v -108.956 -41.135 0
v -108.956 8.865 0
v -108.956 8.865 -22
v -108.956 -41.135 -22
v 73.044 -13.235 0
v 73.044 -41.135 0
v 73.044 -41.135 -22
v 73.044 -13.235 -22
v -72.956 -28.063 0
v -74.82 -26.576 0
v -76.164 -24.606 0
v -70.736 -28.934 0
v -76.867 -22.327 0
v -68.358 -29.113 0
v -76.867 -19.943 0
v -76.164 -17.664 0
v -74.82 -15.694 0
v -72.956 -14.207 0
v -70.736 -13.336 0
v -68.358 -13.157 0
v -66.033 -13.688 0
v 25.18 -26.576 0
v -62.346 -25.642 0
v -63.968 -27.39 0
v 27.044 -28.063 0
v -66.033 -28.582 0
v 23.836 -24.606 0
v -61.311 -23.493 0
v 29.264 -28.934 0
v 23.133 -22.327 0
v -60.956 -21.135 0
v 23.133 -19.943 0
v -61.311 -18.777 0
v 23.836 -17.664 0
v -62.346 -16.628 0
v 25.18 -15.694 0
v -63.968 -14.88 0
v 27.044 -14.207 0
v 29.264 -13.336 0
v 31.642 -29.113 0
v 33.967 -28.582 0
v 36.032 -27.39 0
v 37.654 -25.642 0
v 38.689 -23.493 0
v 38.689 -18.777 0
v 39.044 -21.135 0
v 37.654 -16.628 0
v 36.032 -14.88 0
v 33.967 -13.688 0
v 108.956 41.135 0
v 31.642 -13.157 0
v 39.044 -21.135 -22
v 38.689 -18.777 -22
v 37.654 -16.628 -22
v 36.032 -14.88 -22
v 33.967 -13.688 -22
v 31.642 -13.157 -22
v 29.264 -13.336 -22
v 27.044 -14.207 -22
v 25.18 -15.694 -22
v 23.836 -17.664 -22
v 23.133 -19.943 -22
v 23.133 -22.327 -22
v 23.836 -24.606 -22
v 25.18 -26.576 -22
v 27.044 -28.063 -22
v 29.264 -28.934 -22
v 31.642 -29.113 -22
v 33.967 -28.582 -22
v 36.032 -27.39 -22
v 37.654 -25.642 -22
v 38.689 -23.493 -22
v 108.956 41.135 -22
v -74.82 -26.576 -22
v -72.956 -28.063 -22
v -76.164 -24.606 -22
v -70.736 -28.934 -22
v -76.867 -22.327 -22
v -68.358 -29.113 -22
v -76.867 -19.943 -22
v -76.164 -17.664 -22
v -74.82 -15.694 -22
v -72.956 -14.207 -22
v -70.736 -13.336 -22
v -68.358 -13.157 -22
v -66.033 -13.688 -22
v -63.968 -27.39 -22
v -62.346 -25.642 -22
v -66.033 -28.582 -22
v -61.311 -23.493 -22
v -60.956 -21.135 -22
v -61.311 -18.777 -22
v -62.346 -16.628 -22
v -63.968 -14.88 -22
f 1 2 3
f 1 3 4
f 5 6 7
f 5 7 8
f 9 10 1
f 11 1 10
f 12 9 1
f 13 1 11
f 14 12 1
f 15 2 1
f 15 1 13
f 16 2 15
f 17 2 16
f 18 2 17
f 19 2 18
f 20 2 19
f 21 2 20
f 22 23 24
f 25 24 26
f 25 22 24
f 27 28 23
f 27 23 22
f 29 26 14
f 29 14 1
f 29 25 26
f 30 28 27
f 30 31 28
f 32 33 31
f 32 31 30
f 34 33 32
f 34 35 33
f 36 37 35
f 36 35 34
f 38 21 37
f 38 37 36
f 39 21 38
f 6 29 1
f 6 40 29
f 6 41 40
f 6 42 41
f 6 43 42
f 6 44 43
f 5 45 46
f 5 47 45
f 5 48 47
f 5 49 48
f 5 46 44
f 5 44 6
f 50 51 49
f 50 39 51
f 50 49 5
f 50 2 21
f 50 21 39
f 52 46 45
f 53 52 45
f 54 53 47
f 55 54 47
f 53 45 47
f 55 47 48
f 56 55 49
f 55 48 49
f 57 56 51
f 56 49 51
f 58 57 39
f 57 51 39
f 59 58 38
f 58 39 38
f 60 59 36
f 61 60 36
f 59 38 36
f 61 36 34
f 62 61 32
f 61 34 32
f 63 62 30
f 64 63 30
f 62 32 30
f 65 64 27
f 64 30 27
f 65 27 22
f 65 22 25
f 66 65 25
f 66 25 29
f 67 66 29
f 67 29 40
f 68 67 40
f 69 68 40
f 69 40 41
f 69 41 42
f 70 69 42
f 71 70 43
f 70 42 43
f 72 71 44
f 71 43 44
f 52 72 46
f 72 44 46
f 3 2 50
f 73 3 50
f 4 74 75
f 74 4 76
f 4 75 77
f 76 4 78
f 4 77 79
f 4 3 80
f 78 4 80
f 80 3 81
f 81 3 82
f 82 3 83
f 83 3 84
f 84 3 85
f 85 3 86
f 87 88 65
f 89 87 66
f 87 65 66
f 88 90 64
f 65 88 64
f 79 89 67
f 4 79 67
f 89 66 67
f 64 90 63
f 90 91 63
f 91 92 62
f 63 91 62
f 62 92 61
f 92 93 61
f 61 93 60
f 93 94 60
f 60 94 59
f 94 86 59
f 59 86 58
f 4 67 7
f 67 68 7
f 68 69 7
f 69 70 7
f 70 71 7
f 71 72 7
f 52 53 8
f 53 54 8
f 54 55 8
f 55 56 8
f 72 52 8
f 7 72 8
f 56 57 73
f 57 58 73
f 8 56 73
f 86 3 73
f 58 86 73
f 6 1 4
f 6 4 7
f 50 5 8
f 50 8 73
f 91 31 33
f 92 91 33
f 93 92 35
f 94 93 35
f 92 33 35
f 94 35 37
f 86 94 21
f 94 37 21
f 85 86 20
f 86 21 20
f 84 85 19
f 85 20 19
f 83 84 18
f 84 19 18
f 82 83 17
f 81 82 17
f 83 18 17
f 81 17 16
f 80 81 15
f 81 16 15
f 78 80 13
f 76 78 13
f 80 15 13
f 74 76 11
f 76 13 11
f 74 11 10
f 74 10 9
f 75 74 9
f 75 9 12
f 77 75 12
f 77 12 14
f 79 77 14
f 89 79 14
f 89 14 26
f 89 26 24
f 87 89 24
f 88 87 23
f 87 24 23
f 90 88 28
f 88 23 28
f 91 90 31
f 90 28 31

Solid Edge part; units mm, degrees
sketch "Sketch1" plane through (0, 0, 0) normal (0, 0, 1) x (1, 0, 0)
  line L0 (-108.956, -41.135) -> (108.956, -41.135)
  line L1 (108.956, -41.135) -> (108.956, 41.135)
  line L2 (108.956, 41.135) -> (-108.956, 41.135)
  line L3 (-108.956, 41.135) -> (-108.956, -41.135)
extrude "Protrusion1" add sketch "Sketch1" against normal blind 22
sketch "Sketch2" plane through (0, 0, 0) normal (0, 0, 1) x (0, 1, 0)
  line L0 (-41.135, -73.044) -> (-13.235, -73.044)
  line L1 (-13.235, -73.044) -> (41.135, -108.956)
  line L2 (41.135, -108.956) -> (-41.135, -108.956)
  line L3 (-41.135, -108.956) -> (-41.135, -73.044)
extrude "ExtrudedCutout_1" cut sketch "Sketch2" against normal blind 22
sketch "Sketch3" plane through (0, 0, 0) normal (0, 0, 1) x (1, 0, 0)
  line L0 (-108.956, 8.865) -> (108.956, 41.135)
  line L1 (108.956, 41.135) -> (-108.956, 41.135)
  line L2 (-108.956, 41.135) -> (-108.956, 8.865)
extrude "ExtrudedCutout_2" cut sketch "Sketch3" against normal blind 22
sketch "Sketch4" plane through (0, 0, 0) normal (0, 0, 1) x (1, 0, 0)
  circle A0 centre (-68.956, -21.135) radius 8
  circle A1 centre (31.044, -21.135) radius 8
extrude "ExtrudedCutout_3" cut sketch "Sketch4" against normal blind 22
